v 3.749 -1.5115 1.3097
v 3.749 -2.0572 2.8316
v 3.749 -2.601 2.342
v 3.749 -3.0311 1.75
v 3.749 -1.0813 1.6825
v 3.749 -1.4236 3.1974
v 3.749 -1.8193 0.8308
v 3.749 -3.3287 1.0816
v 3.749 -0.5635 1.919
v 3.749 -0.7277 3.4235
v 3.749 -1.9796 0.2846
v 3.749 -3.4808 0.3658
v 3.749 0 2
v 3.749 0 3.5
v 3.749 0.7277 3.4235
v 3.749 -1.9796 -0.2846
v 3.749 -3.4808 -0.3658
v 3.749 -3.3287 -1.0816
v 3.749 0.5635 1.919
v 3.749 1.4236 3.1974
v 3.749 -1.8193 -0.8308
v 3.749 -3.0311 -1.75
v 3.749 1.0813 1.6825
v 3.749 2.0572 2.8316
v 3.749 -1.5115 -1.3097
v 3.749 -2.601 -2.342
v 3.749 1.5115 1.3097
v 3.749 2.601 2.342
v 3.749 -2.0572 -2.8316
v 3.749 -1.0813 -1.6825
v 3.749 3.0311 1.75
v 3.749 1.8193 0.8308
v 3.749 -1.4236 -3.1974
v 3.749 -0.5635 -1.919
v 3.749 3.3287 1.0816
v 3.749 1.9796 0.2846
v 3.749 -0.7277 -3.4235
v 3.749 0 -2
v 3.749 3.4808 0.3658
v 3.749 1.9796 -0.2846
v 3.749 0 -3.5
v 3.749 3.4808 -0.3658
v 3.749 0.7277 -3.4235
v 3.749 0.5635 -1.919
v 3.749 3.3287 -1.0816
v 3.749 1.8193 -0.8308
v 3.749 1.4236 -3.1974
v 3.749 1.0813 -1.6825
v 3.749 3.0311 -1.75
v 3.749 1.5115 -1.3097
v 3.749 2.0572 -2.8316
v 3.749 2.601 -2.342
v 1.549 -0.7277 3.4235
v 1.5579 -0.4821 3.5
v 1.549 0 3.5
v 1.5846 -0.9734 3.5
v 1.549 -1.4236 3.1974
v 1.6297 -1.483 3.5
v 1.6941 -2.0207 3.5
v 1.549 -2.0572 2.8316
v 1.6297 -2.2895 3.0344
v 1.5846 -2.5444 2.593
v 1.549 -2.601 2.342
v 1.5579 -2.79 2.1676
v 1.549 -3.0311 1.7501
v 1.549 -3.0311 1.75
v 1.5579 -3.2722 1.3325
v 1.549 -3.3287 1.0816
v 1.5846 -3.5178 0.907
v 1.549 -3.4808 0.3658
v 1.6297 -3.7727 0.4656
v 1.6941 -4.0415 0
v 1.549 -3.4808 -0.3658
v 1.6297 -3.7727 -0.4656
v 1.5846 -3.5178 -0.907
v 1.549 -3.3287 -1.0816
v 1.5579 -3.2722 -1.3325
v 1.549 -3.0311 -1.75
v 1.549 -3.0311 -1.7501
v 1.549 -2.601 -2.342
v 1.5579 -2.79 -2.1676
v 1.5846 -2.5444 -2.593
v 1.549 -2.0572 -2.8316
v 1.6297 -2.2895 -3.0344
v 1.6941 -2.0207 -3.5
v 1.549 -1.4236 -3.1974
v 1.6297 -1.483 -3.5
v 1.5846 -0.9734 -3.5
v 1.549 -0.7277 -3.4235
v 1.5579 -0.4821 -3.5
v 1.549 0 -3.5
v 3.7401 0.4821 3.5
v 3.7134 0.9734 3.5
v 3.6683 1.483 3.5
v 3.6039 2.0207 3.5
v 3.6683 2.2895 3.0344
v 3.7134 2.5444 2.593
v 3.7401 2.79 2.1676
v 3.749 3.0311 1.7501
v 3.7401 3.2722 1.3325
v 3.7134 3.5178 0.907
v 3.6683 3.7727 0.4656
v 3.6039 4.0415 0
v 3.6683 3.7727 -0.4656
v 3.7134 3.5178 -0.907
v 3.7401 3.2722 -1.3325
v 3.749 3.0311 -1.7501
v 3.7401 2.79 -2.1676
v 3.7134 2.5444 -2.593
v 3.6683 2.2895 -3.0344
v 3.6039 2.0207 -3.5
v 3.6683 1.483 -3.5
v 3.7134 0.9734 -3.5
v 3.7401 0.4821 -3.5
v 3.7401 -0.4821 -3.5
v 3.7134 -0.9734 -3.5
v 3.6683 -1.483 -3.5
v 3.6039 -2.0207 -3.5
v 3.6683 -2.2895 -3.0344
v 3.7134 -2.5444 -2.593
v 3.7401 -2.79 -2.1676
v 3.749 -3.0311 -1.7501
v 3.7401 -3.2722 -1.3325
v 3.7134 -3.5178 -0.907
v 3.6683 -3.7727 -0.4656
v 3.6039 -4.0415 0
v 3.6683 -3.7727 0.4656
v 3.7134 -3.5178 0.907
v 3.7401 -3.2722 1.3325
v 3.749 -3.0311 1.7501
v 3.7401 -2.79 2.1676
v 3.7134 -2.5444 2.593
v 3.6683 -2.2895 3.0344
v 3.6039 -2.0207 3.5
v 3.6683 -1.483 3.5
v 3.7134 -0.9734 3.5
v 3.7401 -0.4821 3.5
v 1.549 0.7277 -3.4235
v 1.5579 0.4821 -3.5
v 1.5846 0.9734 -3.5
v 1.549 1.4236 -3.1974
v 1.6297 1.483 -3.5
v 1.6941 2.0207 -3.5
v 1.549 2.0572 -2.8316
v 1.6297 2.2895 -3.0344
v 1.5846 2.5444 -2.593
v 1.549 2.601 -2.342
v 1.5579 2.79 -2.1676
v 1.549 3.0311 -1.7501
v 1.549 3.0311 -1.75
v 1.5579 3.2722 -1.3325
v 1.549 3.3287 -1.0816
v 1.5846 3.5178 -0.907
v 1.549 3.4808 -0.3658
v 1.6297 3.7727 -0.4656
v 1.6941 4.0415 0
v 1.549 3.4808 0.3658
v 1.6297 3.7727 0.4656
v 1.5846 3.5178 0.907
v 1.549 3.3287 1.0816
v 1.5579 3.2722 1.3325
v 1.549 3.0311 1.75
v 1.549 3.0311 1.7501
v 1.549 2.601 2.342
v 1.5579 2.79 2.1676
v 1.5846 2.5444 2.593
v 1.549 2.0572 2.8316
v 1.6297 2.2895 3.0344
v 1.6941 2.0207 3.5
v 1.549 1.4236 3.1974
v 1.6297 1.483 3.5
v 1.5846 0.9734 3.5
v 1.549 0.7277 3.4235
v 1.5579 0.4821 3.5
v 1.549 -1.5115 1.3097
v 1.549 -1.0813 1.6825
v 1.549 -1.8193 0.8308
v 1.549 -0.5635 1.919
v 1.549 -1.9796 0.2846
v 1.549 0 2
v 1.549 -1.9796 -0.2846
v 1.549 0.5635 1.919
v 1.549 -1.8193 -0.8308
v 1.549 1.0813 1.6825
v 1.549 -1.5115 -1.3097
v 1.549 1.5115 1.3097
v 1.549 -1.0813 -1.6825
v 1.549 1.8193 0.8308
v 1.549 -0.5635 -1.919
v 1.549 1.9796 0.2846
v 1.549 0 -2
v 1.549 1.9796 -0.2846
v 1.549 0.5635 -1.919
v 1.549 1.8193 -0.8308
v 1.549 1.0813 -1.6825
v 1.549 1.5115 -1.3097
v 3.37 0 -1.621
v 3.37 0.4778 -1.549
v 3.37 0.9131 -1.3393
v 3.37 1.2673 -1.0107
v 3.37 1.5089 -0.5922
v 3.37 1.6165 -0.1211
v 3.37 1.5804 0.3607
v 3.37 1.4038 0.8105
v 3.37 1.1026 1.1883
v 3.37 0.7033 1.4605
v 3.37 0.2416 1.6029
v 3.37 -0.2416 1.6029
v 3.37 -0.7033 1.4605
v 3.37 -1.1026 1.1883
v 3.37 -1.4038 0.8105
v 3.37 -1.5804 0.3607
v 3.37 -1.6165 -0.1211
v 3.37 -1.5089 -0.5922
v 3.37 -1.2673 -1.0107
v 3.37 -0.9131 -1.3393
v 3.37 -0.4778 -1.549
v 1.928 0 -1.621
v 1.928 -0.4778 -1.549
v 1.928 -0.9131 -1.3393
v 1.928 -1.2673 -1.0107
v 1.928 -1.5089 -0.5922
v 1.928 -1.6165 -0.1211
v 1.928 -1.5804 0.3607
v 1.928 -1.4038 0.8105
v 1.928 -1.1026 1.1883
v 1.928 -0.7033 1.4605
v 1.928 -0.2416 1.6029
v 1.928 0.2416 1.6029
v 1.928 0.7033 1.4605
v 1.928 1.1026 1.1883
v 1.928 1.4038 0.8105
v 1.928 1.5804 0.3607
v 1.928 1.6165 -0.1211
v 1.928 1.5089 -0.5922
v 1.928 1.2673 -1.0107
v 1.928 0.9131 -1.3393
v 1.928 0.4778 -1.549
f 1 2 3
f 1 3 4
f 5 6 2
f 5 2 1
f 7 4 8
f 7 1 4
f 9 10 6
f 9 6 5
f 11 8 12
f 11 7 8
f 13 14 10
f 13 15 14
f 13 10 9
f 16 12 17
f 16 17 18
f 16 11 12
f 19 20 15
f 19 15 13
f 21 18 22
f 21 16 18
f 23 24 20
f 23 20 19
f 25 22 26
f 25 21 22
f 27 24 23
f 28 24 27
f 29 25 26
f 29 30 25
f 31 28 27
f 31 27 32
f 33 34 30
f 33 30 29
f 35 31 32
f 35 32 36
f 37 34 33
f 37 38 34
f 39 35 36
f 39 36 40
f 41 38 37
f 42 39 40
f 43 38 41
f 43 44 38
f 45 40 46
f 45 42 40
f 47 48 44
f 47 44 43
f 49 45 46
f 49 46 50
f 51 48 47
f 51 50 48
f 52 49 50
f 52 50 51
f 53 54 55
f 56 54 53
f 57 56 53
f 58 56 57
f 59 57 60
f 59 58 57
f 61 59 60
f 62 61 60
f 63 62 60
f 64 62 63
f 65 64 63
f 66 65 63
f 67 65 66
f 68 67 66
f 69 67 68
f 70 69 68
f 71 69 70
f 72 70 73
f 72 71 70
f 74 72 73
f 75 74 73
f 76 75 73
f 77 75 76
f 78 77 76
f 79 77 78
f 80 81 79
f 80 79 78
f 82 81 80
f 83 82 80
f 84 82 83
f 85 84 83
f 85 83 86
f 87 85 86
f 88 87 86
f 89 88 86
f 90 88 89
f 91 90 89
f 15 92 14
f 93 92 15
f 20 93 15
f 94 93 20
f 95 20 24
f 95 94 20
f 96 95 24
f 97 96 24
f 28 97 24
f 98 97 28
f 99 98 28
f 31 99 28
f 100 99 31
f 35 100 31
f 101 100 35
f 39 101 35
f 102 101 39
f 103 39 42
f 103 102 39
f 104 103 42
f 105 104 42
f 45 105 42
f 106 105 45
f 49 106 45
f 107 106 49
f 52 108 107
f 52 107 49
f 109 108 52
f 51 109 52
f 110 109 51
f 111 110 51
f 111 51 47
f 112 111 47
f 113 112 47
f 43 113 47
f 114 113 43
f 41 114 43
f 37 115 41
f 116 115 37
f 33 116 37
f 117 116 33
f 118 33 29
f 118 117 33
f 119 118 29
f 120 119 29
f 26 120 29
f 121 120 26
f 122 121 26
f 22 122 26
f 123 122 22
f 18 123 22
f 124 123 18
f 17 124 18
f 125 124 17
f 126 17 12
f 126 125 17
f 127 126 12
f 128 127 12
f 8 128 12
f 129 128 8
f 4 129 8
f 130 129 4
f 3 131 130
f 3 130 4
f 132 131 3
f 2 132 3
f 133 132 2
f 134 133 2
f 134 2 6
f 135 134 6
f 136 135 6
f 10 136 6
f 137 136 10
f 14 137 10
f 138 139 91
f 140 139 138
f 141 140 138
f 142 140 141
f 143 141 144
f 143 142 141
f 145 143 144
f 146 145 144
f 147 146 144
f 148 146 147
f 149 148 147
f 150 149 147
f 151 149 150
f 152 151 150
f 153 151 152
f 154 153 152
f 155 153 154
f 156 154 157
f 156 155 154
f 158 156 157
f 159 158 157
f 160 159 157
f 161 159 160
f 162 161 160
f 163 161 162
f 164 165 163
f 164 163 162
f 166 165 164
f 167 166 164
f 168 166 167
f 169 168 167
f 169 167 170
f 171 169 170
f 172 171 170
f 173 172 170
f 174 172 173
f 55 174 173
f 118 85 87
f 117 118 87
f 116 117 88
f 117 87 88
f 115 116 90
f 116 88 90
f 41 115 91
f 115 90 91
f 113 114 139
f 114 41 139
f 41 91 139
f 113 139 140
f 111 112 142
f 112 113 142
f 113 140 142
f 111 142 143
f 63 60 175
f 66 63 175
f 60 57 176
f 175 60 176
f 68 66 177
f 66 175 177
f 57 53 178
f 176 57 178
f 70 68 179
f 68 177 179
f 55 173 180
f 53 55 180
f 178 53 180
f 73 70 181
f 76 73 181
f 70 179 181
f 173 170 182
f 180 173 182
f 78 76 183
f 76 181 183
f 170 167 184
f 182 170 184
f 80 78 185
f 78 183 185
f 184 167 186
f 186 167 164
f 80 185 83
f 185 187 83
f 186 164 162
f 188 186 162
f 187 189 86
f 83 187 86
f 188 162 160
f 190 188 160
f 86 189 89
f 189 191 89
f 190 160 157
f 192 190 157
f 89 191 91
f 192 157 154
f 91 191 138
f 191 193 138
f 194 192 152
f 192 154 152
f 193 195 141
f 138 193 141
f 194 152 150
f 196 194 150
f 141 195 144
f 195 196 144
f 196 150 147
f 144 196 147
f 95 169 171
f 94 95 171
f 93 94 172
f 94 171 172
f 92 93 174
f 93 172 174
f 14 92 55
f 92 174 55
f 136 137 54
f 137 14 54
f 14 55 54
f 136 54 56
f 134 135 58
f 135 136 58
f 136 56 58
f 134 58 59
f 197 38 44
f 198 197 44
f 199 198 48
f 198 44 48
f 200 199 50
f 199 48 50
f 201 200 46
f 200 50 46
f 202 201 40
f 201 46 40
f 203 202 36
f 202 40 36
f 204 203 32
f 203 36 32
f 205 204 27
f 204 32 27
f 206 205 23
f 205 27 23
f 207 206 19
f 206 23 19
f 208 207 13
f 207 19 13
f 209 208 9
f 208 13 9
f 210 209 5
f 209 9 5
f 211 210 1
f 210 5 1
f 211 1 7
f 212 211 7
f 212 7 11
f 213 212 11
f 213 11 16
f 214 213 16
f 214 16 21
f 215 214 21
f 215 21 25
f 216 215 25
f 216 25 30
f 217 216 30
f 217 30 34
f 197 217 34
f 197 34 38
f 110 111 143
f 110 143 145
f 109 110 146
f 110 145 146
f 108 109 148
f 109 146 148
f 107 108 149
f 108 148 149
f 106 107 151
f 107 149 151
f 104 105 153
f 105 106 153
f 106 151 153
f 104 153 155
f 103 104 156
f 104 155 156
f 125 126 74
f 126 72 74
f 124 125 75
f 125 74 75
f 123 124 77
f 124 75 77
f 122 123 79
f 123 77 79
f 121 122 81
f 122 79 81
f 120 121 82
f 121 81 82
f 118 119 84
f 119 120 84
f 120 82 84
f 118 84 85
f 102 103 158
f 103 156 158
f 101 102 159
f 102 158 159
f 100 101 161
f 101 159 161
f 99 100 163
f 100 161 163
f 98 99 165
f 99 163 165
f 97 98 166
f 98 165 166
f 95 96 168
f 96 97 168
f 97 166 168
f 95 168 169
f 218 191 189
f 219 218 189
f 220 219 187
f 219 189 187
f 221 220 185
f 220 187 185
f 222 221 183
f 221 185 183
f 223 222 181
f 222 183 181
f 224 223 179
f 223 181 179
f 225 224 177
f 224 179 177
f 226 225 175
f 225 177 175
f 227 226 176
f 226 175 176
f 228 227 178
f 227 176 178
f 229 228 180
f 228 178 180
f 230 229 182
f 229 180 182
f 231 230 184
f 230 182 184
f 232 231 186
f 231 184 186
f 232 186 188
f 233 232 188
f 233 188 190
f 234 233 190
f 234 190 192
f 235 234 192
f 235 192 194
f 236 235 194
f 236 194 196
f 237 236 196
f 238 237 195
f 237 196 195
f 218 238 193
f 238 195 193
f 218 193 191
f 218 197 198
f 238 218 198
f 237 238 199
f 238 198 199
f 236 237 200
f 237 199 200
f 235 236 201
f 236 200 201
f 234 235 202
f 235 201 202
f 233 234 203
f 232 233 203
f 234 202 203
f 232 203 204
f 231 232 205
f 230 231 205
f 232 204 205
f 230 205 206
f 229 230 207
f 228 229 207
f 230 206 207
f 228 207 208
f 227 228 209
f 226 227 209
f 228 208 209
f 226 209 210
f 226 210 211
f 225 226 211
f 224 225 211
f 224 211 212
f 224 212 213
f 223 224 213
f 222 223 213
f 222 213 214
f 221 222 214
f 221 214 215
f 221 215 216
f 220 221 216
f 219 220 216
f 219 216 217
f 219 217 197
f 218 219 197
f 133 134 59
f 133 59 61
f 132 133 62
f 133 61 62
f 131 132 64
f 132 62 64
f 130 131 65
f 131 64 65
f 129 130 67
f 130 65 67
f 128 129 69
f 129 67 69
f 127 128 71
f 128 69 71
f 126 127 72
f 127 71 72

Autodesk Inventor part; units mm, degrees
sketch "Skizze_1" plane through (0, 0, 0) normal (0, 1, 0) x (-1, 0, 0)
  line L0 (-3.749, 0) -> (-1.549, 0)
  line L1 (-1.549, 0) -> (-1.549, -3.5)
  line L2 (-1.549, -3.5) -> (-2.649, -7.6053)
  line L3 (-2.649, -7.6053) -> (-3.749, -3.5)
  line L4 (-3.749, -3.5) -> (-3.749, 0)
  line L5 (-3.749, 0) -> (-1.549, 0)
revolve "Revolution1" add sketch "Skizze_1" angle 360 about axis through (3.749, 0, 0) along (1, 0, 0)
sketch "Skizze_2" plane through (0, 0, 0) normal (1, 0, 0) x (0, 1, 0)
  line L0 (-35, 26) -> (-35, -52)
  line L1 (-35, -52) -> (26, -52)
  line L2 (26, -52) -> (26, 26)
  line L3 (26, 26) -> (-35, 26)
  line L4 (-2.0207, 3.5) -> (-4.0415, 0)
  line L5 (-4.0415, 0) -> (-2.0207, -3.5)
  line L6 (-2.0207, -3.5) -> (2.0207, -3.5)
  line L7 (2.0207, -3.5) -> (4.0415, 0)
  line L8 (4.0415, 0) -> (2.0207, 3.5)
  line L9 (2.0207, 3.5) -> (-2.0207, 3.5)
extrude "Extrusion1" cut sketch "Skizze_2" along normal blind 10
sketch "Skizze_3" plane through (0, 0, 0) normal (0, 1, 0) x (-1, 0, 0)
  line L0 (-3.749, 0) -> (-1.549, 0)
  line L1 (-1.549, 0) -> (-1.549, -2)
  line L2 (-1.549, -2) -> (-1.928, -1.621)
  line L3 (-1.928, -1.621) -> (-3.37, -1.621)
  line L4 (-3.37, -1.621) -> (-3.749, -2)
  line L5 (-3.749, -2) -> (-3.749, 0)
  line L6 (-3.749, 0) -> (-1.549, 0)
revolve "Revolution2" cut sketch "Skizze_3" angle 360 about axis through (3.749, 0, 0) along (1, 0, 0)
thread "Thread1" size "M4x0.7" class "6H" standard "ISO Metric profile" full length
ref_plane "M_XY" through (0, 0, 0) normal (1, 0, 0) x (0, 0, -1)
ref_plane "M_YZ" through (0, 0, 0) normal (0, 0, -1) x (0, 1, 0)
ref_plane "M_ZX" through (0, 0, 0) normal (0, 1, 0) x (1, 0, 0)
properties part number "205-S-M"
